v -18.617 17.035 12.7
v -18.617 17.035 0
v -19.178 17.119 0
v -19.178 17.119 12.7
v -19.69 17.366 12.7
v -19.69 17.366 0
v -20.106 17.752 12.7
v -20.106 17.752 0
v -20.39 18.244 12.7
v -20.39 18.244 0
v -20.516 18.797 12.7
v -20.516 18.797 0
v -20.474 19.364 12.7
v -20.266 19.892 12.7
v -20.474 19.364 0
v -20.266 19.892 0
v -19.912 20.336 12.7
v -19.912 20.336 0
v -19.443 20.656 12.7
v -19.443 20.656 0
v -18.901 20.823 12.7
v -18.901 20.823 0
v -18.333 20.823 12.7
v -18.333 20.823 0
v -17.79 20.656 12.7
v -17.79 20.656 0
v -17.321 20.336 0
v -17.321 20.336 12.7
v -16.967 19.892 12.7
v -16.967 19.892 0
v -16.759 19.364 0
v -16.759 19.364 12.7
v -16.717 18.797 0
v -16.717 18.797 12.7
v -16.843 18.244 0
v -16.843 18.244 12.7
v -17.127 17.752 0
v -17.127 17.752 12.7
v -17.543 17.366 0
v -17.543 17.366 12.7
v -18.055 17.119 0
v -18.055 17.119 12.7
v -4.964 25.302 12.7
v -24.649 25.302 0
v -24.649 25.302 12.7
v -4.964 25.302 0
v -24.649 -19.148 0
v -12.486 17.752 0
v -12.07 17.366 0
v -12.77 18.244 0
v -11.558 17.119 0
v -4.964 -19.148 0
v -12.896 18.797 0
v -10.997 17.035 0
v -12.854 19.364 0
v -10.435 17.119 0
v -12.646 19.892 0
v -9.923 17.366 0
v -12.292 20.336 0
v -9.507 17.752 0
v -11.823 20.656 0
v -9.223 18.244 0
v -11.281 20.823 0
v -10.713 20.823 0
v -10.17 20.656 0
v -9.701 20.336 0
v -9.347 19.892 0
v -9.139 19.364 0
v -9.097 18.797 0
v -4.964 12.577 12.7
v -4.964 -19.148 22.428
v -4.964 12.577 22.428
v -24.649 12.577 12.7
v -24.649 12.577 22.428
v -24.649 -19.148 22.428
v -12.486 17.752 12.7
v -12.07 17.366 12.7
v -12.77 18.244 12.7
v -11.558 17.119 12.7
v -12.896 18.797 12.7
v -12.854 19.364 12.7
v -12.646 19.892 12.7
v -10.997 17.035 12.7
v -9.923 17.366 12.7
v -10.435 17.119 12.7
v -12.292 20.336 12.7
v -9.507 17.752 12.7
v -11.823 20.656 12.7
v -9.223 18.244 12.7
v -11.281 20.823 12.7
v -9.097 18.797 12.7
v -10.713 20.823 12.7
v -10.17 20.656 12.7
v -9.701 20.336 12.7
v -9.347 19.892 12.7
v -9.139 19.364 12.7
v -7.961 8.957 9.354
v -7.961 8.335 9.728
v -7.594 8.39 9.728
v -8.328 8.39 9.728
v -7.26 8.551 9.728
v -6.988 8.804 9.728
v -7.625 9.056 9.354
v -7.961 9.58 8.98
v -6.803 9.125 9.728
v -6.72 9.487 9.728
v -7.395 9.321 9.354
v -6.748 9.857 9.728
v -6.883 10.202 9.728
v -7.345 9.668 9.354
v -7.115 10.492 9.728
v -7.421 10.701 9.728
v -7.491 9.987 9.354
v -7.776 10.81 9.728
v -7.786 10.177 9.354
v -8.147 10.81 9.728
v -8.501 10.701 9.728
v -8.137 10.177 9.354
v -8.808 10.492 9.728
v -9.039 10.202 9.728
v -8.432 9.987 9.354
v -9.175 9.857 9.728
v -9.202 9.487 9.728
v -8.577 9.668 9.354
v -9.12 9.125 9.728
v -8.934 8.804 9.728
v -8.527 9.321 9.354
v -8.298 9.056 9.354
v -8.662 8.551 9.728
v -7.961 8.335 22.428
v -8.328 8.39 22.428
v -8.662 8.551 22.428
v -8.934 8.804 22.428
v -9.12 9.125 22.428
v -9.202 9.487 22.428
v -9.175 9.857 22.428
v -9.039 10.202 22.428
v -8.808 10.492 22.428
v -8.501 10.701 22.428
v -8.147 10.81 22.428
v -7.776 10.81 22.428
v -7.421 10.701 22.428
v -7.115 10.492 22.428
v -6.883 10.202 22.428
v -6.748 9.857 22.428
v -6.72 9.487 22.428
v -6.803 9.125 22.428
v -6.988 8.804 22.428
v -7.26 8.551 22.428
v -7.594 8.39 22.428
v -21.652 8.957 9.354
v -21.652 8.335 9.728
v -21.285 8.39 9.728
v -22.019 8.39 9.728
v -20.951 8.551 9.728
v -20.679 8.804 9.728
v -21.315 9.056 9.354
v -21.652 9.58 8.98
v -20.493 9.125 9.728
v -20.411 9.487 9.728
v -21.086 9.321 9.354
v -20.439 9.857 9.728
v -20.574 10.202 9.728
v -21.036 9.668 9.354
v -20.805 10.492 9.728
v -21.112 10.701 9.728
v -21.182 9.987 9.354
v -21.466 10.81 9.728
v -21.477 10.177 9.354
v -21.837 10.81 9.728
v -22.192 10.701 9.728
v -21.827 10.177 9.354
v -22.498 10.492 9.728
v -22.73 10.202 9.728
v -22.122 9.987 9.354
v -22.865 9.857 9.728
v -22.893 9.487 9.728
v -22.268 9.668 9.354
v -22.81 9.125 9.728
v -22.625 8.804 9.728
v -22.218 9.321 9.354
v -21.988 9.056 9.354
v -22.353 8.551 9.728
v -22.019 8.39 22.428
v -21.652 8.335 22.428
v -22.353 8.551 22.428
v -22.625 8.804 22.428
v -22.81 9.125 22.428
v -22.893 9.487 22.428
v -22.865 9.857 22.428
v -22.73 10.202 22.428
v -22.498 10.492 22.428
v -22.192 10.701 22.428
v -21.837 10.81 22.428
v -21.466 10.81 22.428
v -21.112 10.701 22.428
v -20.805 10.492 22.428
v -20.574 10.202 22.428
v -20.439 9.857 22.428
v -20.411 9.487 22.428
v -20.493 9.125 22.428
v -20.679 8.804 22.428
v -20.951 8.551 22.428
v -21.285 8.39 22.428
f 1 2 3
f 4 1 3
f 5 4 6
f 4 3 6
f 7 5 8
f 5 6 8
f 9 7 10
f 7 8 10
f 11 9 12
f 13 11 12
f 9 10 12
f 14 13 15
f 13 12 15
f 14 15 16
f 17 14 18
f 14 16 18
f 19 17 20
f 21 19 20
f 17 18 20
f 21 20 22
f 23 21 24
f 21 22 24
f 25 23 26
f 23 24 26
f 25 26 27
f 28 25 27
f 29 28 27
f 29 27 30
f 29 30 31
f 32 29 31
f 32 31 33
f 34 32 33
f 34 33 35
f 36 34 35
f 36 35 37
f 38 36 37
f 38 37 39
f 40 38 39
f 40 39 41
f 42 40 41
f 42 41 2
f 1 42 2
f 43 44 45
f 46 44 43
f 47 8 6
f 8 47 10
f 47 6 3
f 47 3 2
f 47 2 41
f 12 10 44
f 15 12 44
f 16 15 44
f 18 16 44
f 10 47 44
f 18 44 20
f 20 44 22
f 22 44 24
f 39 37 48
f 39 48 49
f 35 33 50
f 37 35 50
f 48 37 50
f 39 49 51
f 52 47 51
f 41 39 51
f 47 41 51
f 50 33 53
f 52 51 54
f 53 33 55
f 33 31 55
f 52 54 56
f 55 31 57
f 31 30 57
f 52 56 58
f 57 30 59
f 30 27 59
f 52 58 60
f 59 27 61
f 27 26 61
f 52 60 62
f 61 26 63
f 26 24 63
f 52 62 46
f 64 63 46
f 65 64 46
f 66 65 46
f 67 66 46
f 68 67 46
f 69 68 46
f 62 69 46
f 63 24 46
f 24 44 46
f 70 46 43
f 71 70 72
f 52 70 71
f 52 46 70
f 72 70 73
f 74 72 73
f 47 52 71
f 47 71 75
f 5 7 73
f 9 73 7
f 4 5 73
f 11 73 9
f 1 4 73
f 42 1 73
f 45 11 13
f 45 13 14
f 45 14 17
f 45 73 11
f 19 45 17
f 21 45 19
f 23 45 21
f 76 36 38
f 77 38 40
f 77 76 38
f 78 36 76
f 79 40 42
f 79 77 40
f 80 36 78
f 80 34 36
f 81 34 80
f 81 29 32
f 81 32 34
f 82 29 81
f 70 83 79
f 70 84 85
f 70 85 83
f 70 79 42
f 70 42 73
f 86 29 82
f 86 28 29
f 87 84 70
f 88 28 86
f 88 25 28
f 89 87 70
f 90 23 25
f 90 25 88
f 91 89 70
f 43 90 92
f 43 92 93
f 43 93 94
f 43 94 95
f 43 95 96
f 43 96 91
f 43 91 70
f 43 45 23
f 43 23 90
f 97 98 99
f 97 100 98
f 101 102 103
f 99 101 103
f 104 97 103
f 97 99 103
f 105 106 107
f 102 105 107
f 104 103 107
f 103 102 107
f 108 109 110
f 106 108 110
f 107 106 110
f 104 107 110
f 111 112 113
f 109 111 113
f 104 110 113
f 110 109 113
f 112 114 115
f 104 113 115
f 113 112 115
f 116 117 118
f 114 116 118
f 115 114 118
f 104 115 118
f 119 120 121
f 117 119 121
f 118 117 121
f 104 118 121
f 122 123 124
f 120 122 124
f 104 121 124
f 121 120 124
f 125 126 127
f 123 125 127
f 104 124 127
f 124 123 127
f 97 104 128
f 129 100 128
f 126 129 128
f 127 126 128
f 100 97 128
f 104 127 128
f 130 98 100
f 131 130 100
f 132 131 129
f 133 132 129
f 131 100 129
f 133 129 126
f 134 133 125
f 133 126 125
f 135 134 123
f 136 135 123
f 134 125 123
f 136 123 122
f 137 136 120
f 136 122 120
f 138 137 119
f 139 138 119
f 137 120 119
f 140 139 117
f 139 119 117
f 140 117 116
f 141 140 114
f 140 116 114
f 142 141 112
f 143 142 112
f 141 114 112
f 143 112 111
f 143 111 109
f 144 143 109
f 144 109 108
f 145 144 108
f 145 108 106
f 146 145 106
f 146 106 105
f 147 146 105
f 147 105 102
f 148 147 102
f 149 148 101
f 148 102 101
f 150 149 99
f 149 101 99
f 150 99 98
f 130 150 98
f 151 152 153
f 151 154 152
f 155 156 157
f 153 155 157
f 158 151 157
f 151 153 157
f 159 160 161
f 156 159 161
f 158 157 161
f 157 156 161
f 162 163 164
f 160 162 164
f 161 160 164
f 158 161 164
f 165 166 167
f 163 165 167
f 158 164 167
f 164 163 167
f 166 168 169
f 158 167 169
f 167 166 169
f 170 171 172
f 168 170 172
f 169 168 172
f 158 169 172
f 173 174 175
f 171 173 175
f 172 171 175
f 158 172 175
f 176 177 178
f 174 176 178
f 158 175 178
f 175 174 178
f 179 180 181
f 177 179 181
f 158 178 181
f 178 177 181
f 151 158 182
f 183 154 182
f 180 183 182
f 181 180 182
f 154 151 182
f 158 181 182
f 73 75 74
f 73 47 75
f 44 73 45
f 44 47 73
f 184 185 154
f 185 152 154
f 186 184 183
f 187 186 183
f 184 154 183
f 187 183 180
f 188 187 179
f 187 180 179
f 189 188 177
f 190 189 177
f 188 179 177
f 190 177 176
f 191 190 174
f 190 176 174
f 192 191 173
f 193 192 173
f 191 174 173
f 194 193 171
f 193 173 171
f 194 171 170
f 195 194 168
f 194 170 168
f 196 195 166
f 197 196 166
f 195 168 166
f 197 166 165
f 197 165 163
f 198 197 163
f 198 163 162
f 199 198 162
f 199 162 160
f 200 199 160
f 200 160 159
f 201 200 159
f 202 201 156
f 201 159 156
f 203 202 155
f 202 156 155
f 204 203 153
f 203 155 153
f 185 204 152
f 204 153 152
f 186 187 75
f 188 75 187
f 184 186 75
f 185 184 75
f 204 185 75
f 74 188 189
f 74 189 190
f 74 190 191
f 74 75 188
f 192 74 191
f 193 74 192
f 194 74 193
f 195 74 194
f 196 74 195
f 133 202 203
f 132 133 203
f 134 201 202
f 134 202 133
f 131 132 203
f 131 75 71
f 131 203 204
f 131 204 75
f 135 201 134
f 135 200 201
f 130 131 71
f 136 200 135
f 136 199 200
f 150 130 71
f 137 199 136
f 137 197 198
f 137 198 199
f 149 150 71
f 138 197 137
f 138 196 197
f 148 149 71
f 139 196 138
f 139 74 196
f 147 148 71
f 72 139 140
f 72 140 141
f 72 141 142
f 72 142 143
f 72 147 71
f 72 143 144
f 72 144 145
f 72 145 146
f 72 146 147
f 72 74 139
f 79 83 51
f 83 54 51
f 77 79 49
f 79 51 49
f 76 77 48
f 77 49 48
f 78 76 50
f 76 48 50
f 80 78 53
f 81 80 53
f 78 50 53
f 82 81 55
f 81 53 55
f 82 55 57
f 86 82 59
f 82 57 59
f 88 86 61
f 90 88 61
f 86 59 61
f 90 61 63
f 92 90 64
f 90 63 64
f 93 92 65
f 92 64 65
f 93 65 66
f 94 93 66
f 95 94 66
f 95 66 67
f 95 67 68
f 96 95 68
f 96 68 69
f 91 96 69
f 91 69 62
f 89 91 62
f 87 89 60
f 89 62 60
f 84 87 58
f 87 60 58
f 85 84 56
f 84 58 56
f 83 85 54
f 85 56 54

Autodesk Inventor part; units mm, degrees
ref_plane "YZ Plane" through (0, 0, 0) normal (1, 0, 0) x (0, 1, 0)
ref_plane "XZ Plane" through (0, 0, 0) normal (0, 1, 0) x (-1, 0, 0)
ref_plane "XY Plane" through (0, 0, 0) normal (0, 0, 1) x (1, 0, 0)
sketch "Sketch1" plane through (0, 0, 0) normal (0, 0, 1) x (1, 0, 0)
  line L0 (-24.6491, 25.3024) -> (-4.9641, 25.3024)
  line L1 (-4.9641, 25.3024) -> (-4.9641, -19.1476)
  line L2 (-4.9641, -19.1476) -> (-24.6491, -19.1476)
  line L3 (-24.6491, -19.1476) -> (-24.6491, 25.3024)
  point P0 (0, 0)
  dimension "d0" = 19.685
  dimension "d1" = 44.45
extrude "Extrusion1" add sketch "Sketch1" along normal blind 12.7
sketch "Sketch2" plane through (0, 0, 12.7) normal (0, 0, 1) x (1, 0, 0)
  line L0 (-4.9641, 25.3024) -> (-4.9641, -19.1476) projected
  line L1 (-24.6491, -19.1476) -> (-4.9641, -19.1476)
  line L2 (-4.9641, -19.1476) -> (-4.9641, 12.577)
  line L3 (-4.9641, 12.577) -> (-24.6491, 12.577)
  line L4 (-24.6491, 12.577) -> (-24.6491, -19.1476)
  point P0 (0, 0)
  dimension "d4" = 31.7246
extrude "Extrusion2" add sketch "Sketch2" along normal blind 9.7282
sketch "Sketch3" plane through (0, 0, 22.4282) normal (0, 0, 1) x (1, 0, 0)
  line L0 (-24.6491, 12.577) -> (-4.9641, 12.577) projected
  line L1 (-4.9641, 12.577) -> (-7.9613, 12.577)
  line L2 (-7.9613, 12.577) -> (-7.9613, 9.5798)
  line L3 (-24.6491, 12.577) -> (-21.6519, 12.577)
  line L4 (-21.6519, 12.577) -> (-21.6519, 9.5798)
  point P0 (0, 0)
  dimension "d7" = 2.9972
  dimension "d8" = 2.9972
  dimension "d9" = 2.9972
  dimension "d10" = 2.9972
hole "Hole1" at (-21.6519, 9.5798, 22.4282) at (-7.9613, 9.5798, 22.4282) direction (0, 0, -1) diameter 2.4892 depth 12.7 tip angle 118
sketch "Sketch4" plane through (0, 0, 12.7) normal (0, 0, 1) x (1, 0, 0)
  line L0 (-24.6491, 12.577) -> (-4.9641, 12.577) projected
  line L1 (-24.6491, 25.3024) -> (-4.9641, 25.3024) projected
  line L2 (-14.8066, 25.3024) -> (-14.8066, 12.577)
  line L3 (-14.8066, 18.9397) -> (-10.9966, 18.9397)
  line L4 (-14.8066, 18.9397) -> (-18.6166, 18.9397)
  point P0 (0, 0)
  dimension "d18" = 3.81
  dimension "d19" = 3.81
hole "Hole2" at (-10.9966, 18.9397, 12.7) at (-18.6166, 18.9397, 12.7) direction (0, 0, -1) diameter 3.81 depth 12.7 tip angle 118 clearance for "Flat Head Machine Screw (82)" size "#6" standard "Ansi Unified Screw Threads"
properties part number "X+Z axis home sensor block"
